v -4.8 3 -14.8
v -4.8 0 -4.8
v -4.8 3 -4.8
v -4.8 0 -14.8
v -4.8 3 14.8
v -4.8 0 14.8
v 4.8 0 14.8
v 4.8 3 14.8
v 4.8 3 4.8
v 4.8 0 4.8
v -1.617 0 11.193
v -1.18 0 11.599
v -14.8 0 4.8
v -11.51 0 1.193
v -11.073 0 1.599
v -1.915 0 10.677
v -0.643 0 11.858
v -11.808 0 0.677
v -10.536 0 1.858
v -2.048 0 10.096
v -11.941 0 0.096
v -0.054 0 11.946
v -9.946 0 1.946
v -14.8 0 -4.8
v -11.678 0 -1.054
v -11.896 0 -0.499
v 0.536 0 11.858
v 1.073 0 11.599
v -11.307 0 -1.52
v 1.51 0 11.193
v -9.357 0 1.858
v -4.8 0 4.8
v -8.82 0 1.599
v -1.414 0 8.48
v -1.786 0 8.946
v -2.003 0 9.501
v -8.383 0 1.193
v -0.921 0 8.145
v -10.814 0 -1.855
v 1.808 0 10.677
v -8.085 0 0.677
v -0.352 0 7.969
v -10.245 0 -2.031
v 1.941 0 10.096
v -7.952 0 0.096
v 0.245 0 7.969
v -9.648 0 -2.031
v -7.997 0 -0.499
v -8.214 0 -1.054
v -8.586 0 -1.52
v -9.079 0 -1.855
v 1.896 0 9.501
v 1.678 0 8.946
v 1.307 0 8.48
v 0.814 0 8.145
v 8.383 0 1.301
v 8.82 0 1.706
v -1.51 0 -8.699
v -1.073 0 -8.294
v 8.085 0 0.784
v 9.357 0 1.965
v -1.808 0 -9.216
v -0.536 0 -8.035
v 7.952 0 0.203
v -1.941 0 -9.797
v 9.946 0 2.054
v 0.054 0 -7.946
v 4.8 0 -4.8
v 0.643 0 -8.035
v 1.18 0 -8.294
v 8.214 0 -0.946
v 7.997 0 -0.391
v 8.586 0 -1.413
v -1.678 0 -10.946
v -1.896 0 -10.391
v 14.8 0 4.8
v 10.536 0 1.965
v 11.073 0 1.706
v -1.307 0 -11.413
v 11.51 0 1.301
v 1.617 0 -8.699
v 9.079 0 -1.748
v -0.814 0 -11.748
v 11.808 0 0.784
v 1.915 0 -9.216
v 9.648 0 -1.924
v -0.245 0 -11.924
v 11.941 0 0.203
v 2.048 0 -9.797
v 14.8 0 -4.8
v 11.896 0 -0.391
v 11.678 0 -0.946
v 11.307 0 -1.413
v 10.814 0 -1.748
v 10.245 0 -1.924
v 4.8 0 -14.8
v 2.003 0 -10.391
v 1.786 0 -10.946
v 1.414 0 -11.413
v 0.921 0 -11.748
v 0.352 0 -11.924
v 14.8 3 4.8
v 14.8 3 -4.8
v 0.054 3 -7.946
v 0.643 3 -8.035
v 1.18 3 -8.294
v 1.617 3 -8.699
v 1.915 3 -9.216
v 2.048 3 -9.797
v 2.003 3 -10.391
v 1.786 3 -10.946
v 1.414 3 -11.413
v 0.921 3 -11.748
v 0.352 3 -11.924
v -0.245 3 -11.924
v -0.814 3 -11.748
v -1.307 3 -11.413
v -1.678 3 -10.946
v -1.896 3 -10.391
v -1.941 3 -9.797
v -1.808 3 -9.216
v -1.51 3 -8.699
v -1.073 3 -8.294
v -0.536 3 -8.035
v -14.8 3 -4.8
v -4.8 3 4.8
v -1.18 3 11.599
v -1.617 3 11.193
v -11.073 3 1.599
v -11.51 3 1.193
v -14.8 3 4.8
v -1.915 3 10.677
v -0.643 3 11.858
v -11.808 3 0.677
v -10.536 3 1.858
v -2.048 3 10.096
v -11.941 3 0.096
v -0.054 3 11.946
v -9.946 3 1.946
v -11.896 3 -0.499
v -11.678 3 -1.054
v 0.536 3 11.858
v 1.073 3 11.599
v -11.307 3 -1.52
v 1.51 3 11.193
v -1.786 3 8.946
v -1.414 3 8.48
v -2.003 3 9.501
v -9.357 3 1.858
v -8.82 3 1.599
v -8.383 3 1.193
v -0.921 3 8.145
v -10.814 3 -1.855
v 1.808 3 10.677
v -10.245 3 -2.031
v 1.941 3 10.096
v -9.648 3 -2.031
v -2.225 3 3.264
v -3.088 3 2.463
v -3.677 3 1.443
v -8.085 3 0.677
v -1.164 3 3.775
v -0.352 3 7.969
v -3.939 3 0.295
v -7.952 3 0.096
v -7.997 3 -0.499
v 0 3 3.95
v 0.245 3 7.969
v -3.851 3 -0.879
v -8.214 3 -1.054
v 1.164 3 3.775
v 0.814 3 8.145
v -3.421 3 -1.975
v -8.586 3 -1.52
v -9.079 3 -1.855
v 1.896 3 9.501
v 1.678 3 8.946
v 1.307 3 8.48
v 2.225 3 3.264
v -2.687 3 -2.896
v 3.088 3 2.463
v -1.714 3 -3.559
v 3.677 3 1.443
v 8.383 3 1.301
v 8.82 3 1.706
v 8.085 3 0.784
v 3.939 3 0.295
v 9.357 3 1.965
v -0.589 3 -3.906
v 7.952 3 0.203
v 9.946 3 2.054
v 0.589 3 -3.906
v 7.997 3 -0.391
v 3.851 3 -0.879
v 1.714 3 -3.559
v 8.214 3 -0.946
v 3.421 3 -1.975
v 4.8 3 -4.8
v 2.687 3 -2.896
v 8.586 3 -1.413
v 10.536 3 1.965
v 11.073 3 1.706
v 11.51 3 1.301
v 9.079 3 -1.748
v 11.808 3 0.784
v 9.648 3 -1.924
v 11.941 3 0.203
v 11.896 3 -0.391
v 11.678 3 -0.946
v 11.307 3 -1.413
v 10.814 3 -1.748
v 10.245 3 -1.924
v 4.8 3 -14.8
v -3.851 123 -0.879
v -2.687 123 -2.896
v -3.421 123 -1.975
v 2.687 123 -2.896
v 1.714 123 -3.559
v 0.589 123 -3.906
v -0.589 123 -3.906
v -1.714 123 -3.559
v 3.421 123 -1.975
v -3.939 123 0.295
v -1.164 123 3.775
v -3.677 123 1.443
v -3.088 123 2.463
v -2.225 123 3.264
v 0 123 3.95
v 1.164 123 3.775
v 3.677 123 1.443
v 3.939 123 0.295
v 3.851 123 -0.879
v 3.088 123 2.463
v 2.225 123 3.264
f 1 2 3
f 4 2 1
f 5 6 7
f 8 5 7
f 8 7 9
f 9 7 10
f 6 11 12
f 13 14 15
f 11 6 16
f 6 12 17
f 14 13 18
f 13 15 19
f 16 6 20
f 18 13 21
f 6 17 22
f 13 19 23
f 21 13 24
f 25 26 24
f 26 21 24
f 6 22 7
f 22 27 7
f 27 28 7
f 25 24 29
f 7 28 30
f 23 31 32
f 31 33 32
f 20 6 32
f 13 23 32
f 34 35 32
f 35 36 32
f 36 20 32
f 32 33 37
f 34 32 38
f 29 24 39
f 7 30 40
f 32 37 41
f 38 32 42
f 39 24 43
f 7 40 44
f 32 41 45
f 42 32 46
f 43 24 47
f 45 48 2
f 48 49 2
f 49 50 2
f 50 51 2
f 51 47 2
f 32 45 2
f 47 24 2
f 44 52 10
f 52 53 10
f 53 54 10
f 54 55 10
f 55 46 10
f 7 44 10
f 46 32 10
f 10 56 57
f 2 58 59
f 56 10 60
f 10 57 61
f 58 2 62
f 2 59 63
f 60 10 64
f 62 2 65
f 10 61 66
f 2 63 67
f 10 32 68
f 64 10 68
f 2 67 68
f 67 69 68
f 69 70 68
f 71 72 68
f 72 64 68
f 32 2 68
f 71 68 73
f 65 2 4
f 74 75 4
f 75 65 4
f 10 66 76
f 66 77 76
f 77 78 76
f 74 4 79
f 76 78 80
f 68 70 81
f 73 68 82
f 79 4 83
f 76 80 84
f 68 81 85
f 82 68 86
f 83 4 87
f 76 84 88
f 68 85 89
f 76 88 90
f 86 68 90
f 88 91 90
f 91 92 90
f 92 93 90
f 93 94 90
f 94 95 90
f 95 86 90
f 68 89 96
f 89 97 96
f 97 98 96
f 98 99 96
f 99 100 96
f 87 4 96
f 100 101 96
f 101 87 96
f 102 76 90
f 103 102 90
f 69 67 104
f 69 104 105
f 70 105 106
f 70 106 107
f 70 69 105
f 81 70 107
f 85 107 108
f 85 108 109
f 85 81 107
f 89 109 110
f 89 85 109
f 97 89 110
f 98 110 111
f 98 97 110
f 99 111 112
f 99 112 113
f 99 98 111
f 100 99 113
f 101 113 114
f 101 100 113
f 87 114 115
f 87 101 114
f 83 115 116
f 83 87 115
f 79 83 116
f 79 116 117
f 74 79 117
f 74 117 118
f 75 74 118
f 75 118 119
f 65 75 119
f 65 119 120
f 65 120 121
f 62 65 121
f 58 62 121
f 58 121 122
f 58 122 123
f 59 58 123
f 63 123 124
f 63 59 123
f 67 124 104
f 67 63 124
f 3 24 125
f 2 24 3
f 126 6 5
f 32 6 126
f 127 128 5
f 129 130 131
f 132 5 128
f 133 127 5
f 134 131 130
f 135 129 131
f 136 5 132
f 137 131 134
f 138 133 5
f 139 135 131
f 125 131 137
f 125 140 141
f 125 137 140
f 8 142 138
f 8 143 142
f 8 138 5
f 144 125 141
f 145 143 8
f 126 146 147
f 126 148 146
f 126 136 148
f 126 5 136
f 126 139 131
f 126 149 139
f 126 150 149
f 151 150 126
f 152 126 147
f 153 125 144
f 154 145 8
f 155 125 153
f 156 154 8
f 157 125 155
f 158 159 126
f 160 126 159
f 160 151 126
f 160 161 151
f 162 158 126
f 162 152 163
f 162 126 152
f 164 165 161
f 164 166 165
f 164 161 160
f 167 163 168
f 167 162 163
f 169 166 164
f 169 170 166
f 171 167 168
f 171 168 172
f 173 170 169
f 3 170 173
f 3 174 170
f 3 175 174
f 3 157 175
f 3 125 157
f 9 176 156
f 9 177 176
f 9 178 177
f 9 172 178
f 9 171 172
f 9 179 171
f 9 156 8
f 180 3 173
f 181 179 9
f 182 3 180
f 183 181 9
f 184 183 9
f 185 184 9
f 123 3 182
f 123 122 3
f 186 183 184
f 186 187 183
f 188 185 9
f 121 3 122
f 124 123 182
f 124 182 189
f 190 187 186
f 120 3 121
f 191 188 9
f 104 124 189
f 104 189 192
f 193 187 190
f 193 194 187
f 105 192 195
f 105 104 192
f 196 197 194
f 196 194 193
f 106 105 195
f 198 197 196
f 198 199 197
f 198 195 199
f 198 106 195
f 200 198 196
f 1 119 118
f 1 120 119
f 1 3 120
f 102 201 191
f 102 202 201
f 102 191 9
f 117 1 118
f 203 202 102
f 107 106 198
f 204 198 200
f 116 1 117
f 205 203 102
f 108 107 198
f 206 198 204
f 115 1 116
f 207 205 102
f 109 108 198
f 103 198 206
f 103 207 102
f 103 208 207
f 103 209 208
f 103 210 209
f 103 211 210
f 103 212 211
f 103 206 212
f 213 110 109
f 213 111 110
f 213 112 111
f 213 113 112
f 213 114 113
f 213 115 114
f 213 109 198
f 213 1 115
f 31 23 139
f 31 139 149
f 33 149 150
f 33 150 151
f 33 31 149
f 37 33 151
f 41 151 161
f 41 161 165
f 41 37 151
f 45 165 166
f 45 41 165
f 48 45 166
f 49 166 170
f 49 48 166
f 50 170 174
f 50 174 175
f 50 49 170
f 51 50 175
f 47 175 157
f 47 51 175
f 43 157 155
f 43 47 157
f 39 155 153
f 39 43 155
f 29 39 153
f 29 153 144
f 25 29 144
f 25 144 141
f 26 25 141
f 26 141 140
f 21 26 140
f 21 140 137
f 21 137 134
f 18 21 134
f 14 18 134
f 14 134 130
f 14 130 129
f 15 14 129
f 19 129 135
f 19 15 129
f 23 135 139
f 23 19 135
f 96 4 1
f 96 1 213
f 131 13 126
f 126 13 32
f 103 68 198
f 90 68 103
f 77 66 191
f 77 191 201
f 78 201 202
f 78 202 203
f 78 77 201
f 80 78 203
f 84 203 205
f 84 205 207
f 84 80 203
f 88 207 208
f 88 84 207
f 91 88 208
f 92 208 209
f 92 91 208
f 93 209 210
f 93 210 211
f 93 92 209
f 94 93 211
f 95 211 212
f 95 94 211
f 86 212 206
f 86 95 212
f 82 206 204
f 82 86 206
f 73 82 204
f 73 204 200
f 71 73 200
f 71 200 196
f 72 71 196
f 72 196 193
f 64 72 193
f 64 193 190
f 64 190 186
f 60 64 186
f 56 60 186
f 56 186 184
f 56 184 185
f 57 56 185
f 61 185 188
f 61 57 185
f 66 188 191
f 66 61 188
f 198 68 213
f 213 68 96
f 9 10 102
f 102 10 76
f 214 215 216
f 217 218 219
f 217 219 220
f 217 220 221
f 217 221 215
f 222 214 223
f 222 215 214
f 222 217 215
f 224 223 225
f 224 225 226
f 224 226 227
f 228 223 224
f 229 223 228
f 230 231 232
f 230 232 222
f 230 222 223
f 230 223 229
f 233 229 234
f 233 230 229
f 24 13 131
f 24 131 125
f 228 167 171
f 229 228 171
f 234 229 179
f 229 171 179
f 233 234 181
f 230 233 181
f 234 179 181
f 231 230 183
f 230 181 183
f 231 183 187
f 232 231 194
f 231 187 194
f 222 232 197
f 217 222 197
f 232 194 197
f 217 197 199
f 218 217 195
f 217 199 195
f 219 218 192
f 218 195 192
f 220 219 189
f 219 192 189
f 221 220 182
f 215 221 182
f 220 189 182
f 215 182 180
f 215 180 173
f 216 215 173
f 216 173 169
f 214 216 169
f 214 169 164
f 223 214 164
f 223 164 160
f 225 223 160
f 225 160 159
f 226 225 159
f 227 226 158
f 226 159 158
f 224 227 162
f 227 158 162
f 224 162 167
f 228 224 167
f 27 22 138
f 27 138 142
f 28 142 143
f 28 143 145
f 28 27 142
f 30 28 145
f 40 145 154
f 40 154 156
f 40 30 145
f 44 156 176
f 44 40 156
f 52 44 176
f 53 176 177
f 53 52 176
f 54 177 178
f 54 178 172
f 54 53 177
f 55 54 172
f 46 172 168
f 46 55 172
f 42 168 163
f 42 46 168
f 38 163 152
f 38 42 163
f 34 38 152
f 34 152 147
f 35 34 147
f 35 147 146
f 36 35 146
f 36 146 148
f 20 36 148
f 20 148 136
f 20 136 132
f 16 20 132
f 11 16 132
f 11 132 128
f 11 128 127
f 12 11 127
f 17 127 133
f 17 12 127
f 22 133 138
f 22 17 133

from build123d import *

# Parameters (mm, degrees)
SKETCH_1_W      = 10
SKETCH_1_H      = 9.6
SKETCH_1_R      = 2
SKETCH_1_W_2    = 9.6
SKETCH_1_H_2    = 10
SKETCH_1_R_2    = 4
EXTRUDE_2_DEPTH = 3
SKETCH_2_R      = 3.95
EXTRUDE_3_DEPTH = 120


with BuildPart() as part:
    # 草图1 → 凸台-拉伸2 (new body)
    # profile 1 of 6: a face of its own
    with BuildSketch(Plane(origin=(0, 0, 0), x_dir=(1, 0, 0), z_dir=(0, 1, 0))):
        with Locations((-9.8, 0)):
            Rectangle(SKETCH_1_W, SKETCH_1_H)
        with Locations(Location((-9.946440474, 0.053559526, 0), (0, 0, 270))):
            Circle(SKETCH_1_R, mode=Mode.SUBTRACT)
    # profile 2 of 6: a face of its own
    with BuildSketch(Plane(origin=(0, 0, 0), x_dir=(1, 0, 0), z_dir=(0, 1, 0))):
        with Locations((0, -9.8)):
            Rectangle(SKETCH_1_W_2, SKETCH_1_H_2)
        with Locations(Location((-0.053559526, -9.946440474, 0), (0, 0, 270))):
            Circle(SKETCH_1_R, mode=Mode.SUBTRACT)
    # profile 3 of 6: a face of its own
    with BuildSketch(Plane(origin=(0, 0, 0), x_dir=(1, 0, 0), z_dir=(0, 1, 0))):
        Rectangle(SKETCH_1_W_2, SKETCH_1_H)
        Circle(SKETCH_1_R_2, mode=Mode.SUBTRACT)
    # profile 4 of 6: a face of its own
    with BuildSketch(Plane(origin=(0, 0, 0), x_dir=(1, 0, 0), z_dir=(0, 1, 0))):
        with Locations((9.8, 0)):
            Rectangle(SKETCH_1_W, SKETCH_1_H)
        with Locations(Location((9.946440474, -0.053559526, 0), (0, 0, 270))):
            Circle(SKETCH_1_R, mode=Mode.SUBTRACT)
    # profile 5 of 6: a face of its own
    with BuildSketch(Plane(origin=(0, 0, 0), x_dir=(1, 0, 0), z_dir=(0, 1, 0))):
        with Locations((0, 9.8)):
            Rectangle(SKETCH_1_W_2, SKETCH_1_H_2)
        with Locations(Location((0.053559526, 9.946440474, 0), (0, 0, 270))):
            Circle(SKETCH_1_R, mode=Mode.SUBTRACT)
    # profile 6 of 6: a face of its own
    with BuildSketch(Plane(origin=(0, 0, 0), x_dir=(1, 0, 0), z_dir=(0, 1, 0))):
        Circle(SKETCH_1_R_2)
    extrude(amount=EXTRUDE_2_DEPTH)

    # 草图2 → 凸台-拉伸3 (add)
    with BuildSketch(Plane(origin=(0, 3, 0), x_dir=(1, 0, 0), z_dir=(0, 1, 0))):
        with Locations(Location((0, 0, 0), (0, 0, 270))):
            Circle(SKETCH_2_R)
    extrude(amount=EXTRUDE_3_DEPTH)


solid = part.part
